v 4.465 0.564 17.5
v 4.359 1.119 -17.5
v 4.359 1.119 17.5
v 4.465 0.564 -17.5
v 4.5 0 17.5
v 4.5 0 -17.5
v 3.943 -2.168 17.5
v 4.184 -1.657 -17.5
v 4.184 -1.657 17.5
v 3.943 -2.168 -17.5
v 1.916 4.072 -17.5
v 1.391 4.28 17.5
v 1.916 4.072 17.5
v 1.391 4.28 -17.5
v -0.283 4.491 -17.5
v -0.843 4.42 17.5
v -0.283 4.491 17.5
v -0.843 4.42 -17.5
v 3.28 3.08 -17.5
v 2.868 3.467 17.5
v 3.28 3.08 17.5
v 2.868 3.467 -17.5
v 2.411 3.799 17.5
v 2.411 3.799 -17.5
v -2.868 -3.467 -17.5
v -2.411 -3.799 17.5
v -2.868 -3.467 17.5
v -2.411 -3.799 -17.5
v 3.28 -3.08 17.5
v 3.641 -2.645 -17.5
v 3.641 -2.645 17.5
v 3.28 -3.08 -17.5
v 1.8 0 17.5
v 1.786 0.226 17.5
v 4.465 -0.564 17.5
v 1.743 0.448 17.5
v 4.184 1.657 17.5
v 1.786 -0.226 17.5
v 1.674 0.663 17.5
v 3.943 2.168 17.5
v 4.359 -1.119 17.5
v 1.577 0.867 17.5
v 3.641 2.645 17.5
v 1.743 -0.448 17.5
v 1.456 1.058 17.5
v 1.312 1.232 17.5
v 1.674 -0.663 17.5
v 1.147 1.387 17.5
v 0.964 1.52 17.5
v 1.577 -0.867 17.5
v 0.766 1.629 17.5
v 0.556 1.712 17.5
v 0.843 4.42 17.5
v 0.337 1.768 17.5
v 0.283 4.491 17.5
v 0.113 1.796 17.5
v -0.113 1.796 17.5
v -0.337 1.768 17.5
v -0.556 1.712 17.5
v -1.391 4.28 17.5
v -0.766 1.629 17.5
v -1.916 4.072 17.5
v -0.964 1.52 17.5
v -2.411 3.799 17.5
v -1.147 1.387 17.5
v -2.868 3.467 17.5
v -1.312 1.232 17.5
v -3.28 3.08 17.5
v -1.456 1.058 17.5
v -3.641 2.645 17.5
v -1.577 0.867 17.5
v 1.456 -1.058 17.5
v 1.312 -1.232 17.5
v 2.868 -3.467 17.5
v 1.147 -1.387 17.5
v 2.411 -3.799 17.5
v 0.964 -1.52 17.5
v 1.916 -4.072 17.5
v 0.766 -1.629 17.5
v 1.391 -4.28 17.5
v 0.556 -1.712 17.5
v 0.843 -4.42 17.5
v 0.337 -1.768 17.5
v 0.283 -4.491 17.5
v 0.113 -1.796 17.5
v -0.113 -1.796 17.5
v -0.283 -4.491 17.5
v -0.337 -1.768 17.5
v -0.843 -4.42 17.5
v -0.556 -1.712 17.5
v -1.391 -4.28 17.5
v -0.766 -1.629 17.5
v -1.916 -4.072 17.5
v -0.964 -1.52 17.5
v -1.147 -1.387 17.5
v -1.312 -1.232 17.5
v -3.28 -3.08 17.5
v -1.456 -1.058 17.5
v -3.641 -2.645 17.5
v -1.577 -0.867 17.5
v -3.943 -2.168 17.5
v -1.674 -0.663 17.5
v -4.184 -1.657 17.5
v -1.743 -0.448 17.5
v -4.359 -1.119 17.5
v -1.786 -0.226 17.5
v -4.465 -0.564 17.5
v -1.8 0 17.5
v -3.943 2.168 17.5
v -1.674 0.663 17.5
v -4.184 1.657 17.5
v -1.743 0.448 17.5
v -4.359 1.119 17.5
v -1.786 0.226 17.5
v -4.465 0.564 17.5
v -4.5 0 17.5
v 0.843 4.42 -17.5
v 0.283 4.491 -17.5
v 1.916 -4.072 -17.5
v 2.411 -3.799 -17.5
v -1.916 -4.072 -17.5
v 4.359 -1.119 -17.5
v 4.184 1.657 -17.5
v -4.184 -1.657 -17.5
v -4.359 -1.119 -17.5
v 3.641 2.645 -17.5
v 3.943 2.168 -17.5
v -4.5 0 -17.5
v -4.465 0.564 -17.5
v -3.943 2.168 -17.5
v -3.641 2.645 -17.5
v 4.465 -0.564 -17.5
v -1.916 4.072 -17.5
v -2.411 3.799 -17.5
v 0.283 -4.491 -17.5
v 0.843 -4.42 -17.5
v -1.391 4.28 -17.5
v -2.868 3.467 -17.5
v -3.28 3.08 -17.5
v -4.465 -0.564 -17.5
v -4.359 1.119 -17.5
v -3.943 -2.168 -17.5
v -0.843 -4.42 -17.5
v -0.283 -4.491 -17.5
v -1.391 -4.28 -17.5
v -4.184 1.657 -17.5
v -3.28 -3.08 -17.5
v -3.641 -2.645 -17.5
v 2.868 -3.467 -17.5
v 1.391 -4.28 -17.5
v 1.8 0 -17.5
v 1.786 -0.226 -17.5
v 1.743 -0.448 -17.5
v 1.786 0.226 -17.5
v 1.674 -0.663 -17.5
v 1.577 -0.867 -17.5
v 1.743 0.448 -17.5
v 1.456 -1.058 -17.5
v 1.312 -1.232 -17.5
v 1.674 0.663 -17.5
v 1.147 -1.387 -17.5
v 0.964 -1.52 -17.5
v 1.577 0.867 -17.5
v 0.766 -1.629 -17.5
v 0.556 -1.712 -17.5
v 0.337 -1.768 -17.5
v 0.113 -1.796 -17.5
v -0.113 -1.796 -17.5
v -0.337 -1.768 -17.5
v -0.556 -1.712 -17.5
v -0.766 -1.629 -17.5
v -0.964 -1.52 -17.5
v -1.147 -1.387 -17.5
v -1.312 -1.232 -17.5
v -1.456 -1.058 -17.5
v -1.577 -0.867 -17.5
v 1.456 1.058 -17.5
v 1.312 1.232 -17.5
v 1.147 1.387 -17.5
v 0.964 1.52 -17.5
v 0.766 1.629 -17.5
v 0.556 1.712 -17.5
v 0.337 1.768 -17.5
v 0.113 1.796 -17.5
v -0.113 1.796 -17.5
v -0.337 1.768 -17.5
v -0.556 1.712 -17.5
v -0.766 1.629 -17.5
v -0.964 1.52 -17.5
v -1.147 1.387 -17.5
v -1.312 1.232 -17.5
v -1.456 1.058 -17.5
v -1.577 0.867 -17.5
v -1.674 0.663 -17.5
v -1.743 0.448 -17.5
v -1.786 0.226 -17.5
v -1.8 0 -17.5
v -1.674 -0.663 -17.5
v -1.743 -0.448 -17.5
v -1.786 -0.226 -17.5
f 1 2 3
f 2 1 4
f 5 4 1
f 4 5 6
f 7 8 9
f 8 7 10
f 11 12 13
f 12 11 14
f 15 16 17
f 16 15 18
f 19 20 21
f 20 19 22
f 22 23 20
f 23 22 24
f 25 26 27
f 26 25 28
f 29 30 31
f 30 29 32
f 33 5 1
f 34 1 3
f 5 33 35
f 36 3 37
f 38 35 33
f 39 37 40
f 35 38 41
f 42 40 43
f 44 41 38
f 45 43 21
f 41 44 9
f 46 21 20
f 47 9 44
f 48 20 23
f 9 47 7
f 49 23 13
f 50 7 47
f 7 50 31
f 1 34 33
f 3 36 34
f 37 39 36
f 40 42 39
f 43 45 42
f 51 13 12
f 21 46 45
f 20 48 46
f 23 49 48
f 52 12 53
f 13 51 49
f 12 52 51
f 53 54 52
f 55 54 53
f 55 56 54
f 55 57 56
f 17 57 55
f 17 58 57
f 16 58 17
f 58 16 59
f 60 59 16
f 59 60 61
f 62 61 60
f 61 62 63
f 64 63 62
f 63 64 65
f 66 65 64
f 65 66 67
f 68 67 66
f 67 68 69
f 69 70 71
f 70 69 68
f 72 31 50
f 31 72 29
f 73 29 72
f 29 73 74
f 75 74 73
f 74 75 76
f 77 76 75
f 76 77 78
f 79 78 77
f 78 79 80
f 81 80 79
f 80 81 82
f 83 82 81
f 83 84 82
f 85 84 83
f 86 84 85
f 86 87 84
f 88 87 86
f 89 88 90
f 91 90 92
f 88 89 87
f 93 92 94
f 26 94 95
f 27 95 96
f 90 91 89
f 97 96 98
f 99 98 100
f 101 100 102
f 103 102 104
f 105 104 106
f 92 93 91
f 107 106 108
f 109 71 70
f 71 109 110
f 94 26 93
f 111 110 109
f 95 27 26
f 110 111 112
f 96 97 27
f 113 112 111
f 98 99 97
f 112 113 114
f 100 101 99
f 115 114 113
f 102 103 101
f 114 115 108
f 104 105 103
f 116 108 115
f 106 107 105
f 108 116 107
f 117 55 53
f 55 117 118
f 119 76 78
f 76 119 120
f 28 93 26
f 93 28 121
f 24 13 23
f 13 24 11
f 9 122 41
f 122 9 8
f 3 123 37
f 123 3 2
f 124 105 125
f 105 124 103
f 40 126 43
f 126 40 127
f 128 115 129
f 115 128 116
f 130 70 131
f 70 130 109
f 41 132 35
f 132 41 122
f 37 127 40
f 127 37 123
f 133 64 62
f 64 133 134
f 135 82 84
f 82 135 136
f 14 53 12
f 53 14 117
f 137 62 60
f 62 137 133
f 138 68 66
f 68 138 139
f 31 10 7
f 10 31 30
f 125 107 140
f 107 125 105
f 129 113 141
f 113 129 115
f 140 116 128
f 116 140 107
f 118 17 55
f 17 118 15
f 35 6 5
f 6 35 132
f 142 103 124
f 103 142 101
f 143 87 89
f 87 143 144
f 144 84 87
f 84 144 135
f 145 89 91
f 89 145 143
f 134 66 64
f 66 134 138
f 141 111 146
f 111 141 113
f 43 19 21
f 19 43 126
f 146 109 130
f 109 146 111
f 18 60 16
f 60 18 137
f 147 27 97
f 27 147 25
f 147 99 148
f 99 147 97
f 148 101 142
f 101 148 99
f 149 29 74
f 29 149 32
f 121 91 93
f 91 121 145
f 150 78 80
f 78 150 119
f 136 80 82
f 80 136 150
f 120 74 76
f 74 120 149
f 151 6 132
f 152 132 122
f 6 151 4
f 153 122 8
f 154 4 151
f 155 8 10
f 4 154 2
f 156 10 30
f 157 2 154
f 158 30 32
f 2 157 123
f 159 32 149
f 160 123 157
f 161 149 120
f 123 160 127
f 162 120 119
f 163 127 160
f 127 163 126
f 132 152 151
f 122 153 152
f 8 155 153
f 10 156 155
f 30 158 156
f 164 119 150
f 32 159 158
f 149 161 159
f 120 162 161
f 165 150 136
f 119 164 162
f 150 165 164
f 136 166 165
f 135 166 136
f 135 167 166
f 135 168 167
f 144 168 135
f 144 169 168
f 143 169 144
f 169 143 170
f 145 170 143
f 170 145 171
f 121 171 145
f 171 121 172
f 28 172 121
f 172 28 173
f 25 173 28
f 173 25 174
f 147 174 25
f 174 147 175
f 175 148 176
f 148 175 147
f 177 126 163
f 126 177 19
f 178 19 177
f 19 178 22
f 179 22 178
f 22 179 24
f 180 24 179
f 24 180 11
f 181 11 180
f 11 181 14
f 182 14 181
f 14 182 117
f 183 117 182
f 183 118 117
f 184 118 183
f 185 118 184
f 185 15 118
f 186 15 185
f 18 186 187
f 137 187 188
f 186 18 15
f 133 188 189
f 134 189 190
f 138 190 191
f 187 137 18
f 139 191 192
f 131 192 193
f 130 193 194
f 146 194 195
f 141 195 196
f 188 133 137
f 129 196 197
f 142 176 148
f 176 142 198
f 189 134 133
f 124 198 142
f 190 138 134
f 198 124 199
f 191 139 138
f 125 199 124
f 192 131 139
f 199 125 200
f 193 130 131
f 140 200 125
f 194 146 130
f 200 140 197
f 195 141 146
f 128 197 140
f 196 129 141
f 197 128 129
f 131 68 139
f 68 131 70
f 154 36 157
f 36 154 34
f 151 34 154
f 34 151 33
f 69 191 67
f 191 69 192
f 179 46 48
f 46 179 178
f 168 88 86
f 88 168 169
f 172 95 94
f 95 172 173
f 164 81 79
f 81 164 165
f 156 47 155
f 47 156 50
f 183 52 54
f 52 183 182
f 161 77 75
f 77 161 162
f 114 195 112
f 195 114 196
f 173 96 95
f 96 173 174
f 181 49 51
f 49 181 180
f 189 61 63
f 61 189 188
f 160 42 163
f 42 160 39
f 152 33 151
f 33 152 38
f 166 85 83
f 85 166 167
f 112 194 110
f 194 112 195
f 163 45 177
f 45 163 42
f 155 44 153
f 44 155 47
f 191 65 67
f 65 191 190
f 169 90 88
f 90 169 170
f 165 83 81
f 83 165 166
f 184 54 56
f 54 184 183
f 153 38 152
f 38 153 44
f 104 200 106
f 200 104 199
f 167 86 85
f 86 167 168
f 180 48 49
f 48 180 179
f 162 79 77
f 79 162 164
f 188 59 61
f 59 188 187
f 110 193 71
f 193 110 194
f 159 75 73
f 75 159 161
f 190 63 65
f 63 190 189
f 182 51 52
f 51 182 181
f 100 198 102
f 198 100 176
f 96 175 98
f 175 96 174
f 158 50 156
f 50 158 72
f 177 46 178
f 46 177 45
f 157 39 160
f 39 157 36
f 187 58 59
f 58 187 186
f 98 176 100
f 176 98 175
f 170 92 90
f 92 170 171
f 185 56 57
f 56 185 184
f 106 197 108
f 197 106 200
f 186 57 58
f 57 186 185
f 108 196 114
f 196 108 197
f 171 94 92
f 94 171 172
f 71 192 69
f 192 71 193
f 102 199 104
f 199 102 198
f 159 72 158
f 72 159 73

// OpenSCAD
$fn = 50;


difference() {
	union() {
		translate(v = [0, 0, -17.5000000000]) {
			cylinder(h = 35, r = 4.5000000000);
		}
	}
	union() {
		#translate(v = [0, 0, -100.0000000000]) {
			cylinder(h = 200, r = 1.8000000000);
		}
	}
}
